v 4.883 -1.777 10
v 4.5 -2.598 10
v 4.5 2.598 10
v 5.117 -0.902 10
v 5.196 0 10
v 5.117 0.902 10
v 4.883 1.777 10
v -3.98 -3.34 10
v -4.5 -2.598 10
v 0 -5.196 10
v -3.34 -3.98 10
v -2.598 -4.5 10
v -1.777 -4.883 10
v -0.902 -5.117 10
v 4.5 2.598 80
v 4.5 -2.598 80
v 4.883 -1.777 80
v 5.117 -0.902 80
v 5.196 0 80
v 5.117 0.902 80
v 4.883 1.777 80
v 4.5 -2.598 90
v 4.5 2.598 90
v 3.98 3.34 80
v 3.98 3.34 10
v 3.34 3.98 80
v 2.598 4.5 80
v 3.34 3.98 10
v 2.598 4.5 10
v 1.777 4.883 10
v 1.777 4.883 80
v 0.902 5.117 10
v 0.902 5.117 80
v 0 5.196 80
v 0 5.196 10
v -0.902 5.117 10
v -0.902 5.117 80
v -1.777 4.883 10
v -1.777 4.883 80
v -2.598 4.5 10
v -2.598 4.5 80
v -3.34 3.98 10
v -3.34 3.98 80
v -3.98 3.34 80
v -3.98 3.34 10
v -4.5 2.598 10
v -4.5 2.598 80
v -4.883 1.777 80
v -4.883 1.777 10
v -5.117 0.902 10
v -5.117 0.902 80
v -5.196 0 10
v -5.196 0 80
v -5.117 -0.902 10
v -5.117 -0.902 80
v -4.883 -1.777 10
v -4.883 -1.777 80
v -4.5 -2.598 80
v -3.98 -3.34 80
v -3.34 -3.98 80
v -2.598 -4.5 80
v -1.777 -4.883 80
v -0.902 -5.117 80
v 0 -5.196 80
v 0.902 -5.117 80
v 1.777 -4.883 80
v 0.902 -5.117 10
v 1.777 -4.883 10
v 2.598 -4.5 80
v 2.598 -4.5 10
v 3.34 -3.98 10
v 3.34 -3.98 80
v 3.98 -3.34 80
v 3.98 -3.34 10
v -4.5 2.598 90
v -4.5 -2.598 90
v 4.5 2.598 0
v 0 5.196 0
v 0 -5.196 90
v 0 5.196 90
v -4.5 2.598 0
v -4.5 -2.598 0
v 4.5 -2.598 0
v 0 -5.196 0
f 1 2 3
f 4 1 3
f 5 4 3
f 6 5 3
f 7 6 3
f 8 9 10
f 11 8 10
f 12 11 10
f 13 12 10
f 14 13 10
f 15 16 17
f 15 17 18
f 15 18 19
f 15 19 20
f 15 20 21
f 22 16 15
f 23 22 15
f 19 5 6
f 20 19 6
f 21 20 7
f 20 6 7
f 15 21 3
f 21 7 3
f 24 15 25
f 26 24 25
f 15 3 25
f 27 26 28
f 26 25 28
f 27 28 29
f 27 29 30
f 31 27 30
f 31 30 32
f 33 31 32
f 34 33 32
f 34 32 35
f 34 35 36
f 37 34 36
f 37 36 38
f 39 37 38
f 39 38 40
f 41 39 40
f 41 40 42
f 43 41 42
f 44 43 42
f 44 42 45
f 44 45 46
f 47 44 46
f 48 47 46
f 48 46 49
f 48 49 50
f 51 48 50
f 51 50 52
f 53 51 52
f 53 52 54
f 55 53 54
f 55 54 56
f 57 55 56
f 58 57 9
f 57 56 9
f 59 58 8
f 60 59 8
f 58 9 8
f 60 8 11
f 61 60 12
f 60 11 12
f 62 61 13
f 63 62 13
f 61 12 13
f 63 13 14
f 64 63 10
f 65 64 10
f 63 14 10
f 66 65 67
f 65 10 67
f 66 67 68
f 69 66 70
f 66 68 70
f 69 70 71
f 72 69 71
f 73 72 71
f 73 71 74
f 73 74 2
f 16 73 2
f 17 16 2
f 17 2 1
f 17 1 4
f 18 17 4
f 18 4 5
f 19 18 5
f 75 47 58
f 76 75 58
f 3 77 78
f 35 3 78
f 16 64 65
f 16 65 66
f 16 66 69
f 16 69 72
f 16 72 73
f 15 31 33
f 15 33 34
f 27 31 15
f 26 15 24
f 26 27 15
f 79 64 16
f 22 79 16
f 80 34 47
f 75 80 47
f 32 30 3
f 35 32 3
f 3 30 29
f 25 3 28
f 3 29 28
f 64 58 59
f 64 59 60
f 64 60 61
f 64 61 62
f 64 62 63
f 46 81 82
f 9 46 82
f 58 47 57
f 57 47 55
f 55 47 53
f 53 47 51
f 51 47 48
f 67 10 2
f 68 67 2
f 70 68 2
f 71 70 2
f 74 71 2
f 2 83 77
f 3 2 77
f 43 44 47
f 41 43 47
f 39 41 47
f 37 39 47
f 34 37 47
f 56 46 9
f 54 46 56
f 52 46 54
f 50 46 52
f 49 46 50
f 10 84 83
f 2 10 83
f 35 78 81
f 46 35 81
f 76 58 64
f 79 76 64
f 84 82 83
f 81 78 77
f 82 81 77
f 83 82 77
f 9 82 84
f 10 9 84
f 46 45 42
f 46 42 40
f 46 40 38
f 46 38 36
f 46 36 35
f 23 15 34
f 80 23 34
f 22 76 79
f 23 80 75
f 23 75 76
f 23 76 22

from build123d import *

# Parameters (mm, degrees)
SALIENTE_EXTRUIR1_DEPTH = 10
CROQUIS2_R              = 5.196152423
SALIENTE_EXTRUIR3_DEPTH = 70
SALIENTE_EXTRUIR4_DEPTH = 10


with BuildPart() as part:
    # Croquis1 → Saliente-Extruir1 (new body)
    with BuildSketch(Plane.XY):
        Polygon((0, 5.196152423), (-4.5, 2.598076211), (-4.5, -2.598076211), (0, -5.196152423), (4.5, -2.598076211), (4.5, 2.598076211), align=None)
    extrude(amount=SALIENTE_EXTRUIR1_DEPTH)

    # Croquis2 → Saliente-Extruir3 (add)
    with BuildSketch(Plane.XY.offset(10)):
        Circle(CROQUIS2_R)
    extrude(amount=SALIENTE_EXTRUIR3_DEPTH)

    # Croquis3 → Saliente-Extruir4 (add)
    with BuildSketch(Plane.XY.offset(80)):
        Polygon((0, 5.196152423), (-4.5, 2.598076211), (-4.5, -2.598076211), (0, -5.196152423), (4.5, -2.598076211), (4.5, 2.598076211), align=None)
    extrude(amount=SALIENTE_EXTRUIR4_DEPTH)


solid = part.part
